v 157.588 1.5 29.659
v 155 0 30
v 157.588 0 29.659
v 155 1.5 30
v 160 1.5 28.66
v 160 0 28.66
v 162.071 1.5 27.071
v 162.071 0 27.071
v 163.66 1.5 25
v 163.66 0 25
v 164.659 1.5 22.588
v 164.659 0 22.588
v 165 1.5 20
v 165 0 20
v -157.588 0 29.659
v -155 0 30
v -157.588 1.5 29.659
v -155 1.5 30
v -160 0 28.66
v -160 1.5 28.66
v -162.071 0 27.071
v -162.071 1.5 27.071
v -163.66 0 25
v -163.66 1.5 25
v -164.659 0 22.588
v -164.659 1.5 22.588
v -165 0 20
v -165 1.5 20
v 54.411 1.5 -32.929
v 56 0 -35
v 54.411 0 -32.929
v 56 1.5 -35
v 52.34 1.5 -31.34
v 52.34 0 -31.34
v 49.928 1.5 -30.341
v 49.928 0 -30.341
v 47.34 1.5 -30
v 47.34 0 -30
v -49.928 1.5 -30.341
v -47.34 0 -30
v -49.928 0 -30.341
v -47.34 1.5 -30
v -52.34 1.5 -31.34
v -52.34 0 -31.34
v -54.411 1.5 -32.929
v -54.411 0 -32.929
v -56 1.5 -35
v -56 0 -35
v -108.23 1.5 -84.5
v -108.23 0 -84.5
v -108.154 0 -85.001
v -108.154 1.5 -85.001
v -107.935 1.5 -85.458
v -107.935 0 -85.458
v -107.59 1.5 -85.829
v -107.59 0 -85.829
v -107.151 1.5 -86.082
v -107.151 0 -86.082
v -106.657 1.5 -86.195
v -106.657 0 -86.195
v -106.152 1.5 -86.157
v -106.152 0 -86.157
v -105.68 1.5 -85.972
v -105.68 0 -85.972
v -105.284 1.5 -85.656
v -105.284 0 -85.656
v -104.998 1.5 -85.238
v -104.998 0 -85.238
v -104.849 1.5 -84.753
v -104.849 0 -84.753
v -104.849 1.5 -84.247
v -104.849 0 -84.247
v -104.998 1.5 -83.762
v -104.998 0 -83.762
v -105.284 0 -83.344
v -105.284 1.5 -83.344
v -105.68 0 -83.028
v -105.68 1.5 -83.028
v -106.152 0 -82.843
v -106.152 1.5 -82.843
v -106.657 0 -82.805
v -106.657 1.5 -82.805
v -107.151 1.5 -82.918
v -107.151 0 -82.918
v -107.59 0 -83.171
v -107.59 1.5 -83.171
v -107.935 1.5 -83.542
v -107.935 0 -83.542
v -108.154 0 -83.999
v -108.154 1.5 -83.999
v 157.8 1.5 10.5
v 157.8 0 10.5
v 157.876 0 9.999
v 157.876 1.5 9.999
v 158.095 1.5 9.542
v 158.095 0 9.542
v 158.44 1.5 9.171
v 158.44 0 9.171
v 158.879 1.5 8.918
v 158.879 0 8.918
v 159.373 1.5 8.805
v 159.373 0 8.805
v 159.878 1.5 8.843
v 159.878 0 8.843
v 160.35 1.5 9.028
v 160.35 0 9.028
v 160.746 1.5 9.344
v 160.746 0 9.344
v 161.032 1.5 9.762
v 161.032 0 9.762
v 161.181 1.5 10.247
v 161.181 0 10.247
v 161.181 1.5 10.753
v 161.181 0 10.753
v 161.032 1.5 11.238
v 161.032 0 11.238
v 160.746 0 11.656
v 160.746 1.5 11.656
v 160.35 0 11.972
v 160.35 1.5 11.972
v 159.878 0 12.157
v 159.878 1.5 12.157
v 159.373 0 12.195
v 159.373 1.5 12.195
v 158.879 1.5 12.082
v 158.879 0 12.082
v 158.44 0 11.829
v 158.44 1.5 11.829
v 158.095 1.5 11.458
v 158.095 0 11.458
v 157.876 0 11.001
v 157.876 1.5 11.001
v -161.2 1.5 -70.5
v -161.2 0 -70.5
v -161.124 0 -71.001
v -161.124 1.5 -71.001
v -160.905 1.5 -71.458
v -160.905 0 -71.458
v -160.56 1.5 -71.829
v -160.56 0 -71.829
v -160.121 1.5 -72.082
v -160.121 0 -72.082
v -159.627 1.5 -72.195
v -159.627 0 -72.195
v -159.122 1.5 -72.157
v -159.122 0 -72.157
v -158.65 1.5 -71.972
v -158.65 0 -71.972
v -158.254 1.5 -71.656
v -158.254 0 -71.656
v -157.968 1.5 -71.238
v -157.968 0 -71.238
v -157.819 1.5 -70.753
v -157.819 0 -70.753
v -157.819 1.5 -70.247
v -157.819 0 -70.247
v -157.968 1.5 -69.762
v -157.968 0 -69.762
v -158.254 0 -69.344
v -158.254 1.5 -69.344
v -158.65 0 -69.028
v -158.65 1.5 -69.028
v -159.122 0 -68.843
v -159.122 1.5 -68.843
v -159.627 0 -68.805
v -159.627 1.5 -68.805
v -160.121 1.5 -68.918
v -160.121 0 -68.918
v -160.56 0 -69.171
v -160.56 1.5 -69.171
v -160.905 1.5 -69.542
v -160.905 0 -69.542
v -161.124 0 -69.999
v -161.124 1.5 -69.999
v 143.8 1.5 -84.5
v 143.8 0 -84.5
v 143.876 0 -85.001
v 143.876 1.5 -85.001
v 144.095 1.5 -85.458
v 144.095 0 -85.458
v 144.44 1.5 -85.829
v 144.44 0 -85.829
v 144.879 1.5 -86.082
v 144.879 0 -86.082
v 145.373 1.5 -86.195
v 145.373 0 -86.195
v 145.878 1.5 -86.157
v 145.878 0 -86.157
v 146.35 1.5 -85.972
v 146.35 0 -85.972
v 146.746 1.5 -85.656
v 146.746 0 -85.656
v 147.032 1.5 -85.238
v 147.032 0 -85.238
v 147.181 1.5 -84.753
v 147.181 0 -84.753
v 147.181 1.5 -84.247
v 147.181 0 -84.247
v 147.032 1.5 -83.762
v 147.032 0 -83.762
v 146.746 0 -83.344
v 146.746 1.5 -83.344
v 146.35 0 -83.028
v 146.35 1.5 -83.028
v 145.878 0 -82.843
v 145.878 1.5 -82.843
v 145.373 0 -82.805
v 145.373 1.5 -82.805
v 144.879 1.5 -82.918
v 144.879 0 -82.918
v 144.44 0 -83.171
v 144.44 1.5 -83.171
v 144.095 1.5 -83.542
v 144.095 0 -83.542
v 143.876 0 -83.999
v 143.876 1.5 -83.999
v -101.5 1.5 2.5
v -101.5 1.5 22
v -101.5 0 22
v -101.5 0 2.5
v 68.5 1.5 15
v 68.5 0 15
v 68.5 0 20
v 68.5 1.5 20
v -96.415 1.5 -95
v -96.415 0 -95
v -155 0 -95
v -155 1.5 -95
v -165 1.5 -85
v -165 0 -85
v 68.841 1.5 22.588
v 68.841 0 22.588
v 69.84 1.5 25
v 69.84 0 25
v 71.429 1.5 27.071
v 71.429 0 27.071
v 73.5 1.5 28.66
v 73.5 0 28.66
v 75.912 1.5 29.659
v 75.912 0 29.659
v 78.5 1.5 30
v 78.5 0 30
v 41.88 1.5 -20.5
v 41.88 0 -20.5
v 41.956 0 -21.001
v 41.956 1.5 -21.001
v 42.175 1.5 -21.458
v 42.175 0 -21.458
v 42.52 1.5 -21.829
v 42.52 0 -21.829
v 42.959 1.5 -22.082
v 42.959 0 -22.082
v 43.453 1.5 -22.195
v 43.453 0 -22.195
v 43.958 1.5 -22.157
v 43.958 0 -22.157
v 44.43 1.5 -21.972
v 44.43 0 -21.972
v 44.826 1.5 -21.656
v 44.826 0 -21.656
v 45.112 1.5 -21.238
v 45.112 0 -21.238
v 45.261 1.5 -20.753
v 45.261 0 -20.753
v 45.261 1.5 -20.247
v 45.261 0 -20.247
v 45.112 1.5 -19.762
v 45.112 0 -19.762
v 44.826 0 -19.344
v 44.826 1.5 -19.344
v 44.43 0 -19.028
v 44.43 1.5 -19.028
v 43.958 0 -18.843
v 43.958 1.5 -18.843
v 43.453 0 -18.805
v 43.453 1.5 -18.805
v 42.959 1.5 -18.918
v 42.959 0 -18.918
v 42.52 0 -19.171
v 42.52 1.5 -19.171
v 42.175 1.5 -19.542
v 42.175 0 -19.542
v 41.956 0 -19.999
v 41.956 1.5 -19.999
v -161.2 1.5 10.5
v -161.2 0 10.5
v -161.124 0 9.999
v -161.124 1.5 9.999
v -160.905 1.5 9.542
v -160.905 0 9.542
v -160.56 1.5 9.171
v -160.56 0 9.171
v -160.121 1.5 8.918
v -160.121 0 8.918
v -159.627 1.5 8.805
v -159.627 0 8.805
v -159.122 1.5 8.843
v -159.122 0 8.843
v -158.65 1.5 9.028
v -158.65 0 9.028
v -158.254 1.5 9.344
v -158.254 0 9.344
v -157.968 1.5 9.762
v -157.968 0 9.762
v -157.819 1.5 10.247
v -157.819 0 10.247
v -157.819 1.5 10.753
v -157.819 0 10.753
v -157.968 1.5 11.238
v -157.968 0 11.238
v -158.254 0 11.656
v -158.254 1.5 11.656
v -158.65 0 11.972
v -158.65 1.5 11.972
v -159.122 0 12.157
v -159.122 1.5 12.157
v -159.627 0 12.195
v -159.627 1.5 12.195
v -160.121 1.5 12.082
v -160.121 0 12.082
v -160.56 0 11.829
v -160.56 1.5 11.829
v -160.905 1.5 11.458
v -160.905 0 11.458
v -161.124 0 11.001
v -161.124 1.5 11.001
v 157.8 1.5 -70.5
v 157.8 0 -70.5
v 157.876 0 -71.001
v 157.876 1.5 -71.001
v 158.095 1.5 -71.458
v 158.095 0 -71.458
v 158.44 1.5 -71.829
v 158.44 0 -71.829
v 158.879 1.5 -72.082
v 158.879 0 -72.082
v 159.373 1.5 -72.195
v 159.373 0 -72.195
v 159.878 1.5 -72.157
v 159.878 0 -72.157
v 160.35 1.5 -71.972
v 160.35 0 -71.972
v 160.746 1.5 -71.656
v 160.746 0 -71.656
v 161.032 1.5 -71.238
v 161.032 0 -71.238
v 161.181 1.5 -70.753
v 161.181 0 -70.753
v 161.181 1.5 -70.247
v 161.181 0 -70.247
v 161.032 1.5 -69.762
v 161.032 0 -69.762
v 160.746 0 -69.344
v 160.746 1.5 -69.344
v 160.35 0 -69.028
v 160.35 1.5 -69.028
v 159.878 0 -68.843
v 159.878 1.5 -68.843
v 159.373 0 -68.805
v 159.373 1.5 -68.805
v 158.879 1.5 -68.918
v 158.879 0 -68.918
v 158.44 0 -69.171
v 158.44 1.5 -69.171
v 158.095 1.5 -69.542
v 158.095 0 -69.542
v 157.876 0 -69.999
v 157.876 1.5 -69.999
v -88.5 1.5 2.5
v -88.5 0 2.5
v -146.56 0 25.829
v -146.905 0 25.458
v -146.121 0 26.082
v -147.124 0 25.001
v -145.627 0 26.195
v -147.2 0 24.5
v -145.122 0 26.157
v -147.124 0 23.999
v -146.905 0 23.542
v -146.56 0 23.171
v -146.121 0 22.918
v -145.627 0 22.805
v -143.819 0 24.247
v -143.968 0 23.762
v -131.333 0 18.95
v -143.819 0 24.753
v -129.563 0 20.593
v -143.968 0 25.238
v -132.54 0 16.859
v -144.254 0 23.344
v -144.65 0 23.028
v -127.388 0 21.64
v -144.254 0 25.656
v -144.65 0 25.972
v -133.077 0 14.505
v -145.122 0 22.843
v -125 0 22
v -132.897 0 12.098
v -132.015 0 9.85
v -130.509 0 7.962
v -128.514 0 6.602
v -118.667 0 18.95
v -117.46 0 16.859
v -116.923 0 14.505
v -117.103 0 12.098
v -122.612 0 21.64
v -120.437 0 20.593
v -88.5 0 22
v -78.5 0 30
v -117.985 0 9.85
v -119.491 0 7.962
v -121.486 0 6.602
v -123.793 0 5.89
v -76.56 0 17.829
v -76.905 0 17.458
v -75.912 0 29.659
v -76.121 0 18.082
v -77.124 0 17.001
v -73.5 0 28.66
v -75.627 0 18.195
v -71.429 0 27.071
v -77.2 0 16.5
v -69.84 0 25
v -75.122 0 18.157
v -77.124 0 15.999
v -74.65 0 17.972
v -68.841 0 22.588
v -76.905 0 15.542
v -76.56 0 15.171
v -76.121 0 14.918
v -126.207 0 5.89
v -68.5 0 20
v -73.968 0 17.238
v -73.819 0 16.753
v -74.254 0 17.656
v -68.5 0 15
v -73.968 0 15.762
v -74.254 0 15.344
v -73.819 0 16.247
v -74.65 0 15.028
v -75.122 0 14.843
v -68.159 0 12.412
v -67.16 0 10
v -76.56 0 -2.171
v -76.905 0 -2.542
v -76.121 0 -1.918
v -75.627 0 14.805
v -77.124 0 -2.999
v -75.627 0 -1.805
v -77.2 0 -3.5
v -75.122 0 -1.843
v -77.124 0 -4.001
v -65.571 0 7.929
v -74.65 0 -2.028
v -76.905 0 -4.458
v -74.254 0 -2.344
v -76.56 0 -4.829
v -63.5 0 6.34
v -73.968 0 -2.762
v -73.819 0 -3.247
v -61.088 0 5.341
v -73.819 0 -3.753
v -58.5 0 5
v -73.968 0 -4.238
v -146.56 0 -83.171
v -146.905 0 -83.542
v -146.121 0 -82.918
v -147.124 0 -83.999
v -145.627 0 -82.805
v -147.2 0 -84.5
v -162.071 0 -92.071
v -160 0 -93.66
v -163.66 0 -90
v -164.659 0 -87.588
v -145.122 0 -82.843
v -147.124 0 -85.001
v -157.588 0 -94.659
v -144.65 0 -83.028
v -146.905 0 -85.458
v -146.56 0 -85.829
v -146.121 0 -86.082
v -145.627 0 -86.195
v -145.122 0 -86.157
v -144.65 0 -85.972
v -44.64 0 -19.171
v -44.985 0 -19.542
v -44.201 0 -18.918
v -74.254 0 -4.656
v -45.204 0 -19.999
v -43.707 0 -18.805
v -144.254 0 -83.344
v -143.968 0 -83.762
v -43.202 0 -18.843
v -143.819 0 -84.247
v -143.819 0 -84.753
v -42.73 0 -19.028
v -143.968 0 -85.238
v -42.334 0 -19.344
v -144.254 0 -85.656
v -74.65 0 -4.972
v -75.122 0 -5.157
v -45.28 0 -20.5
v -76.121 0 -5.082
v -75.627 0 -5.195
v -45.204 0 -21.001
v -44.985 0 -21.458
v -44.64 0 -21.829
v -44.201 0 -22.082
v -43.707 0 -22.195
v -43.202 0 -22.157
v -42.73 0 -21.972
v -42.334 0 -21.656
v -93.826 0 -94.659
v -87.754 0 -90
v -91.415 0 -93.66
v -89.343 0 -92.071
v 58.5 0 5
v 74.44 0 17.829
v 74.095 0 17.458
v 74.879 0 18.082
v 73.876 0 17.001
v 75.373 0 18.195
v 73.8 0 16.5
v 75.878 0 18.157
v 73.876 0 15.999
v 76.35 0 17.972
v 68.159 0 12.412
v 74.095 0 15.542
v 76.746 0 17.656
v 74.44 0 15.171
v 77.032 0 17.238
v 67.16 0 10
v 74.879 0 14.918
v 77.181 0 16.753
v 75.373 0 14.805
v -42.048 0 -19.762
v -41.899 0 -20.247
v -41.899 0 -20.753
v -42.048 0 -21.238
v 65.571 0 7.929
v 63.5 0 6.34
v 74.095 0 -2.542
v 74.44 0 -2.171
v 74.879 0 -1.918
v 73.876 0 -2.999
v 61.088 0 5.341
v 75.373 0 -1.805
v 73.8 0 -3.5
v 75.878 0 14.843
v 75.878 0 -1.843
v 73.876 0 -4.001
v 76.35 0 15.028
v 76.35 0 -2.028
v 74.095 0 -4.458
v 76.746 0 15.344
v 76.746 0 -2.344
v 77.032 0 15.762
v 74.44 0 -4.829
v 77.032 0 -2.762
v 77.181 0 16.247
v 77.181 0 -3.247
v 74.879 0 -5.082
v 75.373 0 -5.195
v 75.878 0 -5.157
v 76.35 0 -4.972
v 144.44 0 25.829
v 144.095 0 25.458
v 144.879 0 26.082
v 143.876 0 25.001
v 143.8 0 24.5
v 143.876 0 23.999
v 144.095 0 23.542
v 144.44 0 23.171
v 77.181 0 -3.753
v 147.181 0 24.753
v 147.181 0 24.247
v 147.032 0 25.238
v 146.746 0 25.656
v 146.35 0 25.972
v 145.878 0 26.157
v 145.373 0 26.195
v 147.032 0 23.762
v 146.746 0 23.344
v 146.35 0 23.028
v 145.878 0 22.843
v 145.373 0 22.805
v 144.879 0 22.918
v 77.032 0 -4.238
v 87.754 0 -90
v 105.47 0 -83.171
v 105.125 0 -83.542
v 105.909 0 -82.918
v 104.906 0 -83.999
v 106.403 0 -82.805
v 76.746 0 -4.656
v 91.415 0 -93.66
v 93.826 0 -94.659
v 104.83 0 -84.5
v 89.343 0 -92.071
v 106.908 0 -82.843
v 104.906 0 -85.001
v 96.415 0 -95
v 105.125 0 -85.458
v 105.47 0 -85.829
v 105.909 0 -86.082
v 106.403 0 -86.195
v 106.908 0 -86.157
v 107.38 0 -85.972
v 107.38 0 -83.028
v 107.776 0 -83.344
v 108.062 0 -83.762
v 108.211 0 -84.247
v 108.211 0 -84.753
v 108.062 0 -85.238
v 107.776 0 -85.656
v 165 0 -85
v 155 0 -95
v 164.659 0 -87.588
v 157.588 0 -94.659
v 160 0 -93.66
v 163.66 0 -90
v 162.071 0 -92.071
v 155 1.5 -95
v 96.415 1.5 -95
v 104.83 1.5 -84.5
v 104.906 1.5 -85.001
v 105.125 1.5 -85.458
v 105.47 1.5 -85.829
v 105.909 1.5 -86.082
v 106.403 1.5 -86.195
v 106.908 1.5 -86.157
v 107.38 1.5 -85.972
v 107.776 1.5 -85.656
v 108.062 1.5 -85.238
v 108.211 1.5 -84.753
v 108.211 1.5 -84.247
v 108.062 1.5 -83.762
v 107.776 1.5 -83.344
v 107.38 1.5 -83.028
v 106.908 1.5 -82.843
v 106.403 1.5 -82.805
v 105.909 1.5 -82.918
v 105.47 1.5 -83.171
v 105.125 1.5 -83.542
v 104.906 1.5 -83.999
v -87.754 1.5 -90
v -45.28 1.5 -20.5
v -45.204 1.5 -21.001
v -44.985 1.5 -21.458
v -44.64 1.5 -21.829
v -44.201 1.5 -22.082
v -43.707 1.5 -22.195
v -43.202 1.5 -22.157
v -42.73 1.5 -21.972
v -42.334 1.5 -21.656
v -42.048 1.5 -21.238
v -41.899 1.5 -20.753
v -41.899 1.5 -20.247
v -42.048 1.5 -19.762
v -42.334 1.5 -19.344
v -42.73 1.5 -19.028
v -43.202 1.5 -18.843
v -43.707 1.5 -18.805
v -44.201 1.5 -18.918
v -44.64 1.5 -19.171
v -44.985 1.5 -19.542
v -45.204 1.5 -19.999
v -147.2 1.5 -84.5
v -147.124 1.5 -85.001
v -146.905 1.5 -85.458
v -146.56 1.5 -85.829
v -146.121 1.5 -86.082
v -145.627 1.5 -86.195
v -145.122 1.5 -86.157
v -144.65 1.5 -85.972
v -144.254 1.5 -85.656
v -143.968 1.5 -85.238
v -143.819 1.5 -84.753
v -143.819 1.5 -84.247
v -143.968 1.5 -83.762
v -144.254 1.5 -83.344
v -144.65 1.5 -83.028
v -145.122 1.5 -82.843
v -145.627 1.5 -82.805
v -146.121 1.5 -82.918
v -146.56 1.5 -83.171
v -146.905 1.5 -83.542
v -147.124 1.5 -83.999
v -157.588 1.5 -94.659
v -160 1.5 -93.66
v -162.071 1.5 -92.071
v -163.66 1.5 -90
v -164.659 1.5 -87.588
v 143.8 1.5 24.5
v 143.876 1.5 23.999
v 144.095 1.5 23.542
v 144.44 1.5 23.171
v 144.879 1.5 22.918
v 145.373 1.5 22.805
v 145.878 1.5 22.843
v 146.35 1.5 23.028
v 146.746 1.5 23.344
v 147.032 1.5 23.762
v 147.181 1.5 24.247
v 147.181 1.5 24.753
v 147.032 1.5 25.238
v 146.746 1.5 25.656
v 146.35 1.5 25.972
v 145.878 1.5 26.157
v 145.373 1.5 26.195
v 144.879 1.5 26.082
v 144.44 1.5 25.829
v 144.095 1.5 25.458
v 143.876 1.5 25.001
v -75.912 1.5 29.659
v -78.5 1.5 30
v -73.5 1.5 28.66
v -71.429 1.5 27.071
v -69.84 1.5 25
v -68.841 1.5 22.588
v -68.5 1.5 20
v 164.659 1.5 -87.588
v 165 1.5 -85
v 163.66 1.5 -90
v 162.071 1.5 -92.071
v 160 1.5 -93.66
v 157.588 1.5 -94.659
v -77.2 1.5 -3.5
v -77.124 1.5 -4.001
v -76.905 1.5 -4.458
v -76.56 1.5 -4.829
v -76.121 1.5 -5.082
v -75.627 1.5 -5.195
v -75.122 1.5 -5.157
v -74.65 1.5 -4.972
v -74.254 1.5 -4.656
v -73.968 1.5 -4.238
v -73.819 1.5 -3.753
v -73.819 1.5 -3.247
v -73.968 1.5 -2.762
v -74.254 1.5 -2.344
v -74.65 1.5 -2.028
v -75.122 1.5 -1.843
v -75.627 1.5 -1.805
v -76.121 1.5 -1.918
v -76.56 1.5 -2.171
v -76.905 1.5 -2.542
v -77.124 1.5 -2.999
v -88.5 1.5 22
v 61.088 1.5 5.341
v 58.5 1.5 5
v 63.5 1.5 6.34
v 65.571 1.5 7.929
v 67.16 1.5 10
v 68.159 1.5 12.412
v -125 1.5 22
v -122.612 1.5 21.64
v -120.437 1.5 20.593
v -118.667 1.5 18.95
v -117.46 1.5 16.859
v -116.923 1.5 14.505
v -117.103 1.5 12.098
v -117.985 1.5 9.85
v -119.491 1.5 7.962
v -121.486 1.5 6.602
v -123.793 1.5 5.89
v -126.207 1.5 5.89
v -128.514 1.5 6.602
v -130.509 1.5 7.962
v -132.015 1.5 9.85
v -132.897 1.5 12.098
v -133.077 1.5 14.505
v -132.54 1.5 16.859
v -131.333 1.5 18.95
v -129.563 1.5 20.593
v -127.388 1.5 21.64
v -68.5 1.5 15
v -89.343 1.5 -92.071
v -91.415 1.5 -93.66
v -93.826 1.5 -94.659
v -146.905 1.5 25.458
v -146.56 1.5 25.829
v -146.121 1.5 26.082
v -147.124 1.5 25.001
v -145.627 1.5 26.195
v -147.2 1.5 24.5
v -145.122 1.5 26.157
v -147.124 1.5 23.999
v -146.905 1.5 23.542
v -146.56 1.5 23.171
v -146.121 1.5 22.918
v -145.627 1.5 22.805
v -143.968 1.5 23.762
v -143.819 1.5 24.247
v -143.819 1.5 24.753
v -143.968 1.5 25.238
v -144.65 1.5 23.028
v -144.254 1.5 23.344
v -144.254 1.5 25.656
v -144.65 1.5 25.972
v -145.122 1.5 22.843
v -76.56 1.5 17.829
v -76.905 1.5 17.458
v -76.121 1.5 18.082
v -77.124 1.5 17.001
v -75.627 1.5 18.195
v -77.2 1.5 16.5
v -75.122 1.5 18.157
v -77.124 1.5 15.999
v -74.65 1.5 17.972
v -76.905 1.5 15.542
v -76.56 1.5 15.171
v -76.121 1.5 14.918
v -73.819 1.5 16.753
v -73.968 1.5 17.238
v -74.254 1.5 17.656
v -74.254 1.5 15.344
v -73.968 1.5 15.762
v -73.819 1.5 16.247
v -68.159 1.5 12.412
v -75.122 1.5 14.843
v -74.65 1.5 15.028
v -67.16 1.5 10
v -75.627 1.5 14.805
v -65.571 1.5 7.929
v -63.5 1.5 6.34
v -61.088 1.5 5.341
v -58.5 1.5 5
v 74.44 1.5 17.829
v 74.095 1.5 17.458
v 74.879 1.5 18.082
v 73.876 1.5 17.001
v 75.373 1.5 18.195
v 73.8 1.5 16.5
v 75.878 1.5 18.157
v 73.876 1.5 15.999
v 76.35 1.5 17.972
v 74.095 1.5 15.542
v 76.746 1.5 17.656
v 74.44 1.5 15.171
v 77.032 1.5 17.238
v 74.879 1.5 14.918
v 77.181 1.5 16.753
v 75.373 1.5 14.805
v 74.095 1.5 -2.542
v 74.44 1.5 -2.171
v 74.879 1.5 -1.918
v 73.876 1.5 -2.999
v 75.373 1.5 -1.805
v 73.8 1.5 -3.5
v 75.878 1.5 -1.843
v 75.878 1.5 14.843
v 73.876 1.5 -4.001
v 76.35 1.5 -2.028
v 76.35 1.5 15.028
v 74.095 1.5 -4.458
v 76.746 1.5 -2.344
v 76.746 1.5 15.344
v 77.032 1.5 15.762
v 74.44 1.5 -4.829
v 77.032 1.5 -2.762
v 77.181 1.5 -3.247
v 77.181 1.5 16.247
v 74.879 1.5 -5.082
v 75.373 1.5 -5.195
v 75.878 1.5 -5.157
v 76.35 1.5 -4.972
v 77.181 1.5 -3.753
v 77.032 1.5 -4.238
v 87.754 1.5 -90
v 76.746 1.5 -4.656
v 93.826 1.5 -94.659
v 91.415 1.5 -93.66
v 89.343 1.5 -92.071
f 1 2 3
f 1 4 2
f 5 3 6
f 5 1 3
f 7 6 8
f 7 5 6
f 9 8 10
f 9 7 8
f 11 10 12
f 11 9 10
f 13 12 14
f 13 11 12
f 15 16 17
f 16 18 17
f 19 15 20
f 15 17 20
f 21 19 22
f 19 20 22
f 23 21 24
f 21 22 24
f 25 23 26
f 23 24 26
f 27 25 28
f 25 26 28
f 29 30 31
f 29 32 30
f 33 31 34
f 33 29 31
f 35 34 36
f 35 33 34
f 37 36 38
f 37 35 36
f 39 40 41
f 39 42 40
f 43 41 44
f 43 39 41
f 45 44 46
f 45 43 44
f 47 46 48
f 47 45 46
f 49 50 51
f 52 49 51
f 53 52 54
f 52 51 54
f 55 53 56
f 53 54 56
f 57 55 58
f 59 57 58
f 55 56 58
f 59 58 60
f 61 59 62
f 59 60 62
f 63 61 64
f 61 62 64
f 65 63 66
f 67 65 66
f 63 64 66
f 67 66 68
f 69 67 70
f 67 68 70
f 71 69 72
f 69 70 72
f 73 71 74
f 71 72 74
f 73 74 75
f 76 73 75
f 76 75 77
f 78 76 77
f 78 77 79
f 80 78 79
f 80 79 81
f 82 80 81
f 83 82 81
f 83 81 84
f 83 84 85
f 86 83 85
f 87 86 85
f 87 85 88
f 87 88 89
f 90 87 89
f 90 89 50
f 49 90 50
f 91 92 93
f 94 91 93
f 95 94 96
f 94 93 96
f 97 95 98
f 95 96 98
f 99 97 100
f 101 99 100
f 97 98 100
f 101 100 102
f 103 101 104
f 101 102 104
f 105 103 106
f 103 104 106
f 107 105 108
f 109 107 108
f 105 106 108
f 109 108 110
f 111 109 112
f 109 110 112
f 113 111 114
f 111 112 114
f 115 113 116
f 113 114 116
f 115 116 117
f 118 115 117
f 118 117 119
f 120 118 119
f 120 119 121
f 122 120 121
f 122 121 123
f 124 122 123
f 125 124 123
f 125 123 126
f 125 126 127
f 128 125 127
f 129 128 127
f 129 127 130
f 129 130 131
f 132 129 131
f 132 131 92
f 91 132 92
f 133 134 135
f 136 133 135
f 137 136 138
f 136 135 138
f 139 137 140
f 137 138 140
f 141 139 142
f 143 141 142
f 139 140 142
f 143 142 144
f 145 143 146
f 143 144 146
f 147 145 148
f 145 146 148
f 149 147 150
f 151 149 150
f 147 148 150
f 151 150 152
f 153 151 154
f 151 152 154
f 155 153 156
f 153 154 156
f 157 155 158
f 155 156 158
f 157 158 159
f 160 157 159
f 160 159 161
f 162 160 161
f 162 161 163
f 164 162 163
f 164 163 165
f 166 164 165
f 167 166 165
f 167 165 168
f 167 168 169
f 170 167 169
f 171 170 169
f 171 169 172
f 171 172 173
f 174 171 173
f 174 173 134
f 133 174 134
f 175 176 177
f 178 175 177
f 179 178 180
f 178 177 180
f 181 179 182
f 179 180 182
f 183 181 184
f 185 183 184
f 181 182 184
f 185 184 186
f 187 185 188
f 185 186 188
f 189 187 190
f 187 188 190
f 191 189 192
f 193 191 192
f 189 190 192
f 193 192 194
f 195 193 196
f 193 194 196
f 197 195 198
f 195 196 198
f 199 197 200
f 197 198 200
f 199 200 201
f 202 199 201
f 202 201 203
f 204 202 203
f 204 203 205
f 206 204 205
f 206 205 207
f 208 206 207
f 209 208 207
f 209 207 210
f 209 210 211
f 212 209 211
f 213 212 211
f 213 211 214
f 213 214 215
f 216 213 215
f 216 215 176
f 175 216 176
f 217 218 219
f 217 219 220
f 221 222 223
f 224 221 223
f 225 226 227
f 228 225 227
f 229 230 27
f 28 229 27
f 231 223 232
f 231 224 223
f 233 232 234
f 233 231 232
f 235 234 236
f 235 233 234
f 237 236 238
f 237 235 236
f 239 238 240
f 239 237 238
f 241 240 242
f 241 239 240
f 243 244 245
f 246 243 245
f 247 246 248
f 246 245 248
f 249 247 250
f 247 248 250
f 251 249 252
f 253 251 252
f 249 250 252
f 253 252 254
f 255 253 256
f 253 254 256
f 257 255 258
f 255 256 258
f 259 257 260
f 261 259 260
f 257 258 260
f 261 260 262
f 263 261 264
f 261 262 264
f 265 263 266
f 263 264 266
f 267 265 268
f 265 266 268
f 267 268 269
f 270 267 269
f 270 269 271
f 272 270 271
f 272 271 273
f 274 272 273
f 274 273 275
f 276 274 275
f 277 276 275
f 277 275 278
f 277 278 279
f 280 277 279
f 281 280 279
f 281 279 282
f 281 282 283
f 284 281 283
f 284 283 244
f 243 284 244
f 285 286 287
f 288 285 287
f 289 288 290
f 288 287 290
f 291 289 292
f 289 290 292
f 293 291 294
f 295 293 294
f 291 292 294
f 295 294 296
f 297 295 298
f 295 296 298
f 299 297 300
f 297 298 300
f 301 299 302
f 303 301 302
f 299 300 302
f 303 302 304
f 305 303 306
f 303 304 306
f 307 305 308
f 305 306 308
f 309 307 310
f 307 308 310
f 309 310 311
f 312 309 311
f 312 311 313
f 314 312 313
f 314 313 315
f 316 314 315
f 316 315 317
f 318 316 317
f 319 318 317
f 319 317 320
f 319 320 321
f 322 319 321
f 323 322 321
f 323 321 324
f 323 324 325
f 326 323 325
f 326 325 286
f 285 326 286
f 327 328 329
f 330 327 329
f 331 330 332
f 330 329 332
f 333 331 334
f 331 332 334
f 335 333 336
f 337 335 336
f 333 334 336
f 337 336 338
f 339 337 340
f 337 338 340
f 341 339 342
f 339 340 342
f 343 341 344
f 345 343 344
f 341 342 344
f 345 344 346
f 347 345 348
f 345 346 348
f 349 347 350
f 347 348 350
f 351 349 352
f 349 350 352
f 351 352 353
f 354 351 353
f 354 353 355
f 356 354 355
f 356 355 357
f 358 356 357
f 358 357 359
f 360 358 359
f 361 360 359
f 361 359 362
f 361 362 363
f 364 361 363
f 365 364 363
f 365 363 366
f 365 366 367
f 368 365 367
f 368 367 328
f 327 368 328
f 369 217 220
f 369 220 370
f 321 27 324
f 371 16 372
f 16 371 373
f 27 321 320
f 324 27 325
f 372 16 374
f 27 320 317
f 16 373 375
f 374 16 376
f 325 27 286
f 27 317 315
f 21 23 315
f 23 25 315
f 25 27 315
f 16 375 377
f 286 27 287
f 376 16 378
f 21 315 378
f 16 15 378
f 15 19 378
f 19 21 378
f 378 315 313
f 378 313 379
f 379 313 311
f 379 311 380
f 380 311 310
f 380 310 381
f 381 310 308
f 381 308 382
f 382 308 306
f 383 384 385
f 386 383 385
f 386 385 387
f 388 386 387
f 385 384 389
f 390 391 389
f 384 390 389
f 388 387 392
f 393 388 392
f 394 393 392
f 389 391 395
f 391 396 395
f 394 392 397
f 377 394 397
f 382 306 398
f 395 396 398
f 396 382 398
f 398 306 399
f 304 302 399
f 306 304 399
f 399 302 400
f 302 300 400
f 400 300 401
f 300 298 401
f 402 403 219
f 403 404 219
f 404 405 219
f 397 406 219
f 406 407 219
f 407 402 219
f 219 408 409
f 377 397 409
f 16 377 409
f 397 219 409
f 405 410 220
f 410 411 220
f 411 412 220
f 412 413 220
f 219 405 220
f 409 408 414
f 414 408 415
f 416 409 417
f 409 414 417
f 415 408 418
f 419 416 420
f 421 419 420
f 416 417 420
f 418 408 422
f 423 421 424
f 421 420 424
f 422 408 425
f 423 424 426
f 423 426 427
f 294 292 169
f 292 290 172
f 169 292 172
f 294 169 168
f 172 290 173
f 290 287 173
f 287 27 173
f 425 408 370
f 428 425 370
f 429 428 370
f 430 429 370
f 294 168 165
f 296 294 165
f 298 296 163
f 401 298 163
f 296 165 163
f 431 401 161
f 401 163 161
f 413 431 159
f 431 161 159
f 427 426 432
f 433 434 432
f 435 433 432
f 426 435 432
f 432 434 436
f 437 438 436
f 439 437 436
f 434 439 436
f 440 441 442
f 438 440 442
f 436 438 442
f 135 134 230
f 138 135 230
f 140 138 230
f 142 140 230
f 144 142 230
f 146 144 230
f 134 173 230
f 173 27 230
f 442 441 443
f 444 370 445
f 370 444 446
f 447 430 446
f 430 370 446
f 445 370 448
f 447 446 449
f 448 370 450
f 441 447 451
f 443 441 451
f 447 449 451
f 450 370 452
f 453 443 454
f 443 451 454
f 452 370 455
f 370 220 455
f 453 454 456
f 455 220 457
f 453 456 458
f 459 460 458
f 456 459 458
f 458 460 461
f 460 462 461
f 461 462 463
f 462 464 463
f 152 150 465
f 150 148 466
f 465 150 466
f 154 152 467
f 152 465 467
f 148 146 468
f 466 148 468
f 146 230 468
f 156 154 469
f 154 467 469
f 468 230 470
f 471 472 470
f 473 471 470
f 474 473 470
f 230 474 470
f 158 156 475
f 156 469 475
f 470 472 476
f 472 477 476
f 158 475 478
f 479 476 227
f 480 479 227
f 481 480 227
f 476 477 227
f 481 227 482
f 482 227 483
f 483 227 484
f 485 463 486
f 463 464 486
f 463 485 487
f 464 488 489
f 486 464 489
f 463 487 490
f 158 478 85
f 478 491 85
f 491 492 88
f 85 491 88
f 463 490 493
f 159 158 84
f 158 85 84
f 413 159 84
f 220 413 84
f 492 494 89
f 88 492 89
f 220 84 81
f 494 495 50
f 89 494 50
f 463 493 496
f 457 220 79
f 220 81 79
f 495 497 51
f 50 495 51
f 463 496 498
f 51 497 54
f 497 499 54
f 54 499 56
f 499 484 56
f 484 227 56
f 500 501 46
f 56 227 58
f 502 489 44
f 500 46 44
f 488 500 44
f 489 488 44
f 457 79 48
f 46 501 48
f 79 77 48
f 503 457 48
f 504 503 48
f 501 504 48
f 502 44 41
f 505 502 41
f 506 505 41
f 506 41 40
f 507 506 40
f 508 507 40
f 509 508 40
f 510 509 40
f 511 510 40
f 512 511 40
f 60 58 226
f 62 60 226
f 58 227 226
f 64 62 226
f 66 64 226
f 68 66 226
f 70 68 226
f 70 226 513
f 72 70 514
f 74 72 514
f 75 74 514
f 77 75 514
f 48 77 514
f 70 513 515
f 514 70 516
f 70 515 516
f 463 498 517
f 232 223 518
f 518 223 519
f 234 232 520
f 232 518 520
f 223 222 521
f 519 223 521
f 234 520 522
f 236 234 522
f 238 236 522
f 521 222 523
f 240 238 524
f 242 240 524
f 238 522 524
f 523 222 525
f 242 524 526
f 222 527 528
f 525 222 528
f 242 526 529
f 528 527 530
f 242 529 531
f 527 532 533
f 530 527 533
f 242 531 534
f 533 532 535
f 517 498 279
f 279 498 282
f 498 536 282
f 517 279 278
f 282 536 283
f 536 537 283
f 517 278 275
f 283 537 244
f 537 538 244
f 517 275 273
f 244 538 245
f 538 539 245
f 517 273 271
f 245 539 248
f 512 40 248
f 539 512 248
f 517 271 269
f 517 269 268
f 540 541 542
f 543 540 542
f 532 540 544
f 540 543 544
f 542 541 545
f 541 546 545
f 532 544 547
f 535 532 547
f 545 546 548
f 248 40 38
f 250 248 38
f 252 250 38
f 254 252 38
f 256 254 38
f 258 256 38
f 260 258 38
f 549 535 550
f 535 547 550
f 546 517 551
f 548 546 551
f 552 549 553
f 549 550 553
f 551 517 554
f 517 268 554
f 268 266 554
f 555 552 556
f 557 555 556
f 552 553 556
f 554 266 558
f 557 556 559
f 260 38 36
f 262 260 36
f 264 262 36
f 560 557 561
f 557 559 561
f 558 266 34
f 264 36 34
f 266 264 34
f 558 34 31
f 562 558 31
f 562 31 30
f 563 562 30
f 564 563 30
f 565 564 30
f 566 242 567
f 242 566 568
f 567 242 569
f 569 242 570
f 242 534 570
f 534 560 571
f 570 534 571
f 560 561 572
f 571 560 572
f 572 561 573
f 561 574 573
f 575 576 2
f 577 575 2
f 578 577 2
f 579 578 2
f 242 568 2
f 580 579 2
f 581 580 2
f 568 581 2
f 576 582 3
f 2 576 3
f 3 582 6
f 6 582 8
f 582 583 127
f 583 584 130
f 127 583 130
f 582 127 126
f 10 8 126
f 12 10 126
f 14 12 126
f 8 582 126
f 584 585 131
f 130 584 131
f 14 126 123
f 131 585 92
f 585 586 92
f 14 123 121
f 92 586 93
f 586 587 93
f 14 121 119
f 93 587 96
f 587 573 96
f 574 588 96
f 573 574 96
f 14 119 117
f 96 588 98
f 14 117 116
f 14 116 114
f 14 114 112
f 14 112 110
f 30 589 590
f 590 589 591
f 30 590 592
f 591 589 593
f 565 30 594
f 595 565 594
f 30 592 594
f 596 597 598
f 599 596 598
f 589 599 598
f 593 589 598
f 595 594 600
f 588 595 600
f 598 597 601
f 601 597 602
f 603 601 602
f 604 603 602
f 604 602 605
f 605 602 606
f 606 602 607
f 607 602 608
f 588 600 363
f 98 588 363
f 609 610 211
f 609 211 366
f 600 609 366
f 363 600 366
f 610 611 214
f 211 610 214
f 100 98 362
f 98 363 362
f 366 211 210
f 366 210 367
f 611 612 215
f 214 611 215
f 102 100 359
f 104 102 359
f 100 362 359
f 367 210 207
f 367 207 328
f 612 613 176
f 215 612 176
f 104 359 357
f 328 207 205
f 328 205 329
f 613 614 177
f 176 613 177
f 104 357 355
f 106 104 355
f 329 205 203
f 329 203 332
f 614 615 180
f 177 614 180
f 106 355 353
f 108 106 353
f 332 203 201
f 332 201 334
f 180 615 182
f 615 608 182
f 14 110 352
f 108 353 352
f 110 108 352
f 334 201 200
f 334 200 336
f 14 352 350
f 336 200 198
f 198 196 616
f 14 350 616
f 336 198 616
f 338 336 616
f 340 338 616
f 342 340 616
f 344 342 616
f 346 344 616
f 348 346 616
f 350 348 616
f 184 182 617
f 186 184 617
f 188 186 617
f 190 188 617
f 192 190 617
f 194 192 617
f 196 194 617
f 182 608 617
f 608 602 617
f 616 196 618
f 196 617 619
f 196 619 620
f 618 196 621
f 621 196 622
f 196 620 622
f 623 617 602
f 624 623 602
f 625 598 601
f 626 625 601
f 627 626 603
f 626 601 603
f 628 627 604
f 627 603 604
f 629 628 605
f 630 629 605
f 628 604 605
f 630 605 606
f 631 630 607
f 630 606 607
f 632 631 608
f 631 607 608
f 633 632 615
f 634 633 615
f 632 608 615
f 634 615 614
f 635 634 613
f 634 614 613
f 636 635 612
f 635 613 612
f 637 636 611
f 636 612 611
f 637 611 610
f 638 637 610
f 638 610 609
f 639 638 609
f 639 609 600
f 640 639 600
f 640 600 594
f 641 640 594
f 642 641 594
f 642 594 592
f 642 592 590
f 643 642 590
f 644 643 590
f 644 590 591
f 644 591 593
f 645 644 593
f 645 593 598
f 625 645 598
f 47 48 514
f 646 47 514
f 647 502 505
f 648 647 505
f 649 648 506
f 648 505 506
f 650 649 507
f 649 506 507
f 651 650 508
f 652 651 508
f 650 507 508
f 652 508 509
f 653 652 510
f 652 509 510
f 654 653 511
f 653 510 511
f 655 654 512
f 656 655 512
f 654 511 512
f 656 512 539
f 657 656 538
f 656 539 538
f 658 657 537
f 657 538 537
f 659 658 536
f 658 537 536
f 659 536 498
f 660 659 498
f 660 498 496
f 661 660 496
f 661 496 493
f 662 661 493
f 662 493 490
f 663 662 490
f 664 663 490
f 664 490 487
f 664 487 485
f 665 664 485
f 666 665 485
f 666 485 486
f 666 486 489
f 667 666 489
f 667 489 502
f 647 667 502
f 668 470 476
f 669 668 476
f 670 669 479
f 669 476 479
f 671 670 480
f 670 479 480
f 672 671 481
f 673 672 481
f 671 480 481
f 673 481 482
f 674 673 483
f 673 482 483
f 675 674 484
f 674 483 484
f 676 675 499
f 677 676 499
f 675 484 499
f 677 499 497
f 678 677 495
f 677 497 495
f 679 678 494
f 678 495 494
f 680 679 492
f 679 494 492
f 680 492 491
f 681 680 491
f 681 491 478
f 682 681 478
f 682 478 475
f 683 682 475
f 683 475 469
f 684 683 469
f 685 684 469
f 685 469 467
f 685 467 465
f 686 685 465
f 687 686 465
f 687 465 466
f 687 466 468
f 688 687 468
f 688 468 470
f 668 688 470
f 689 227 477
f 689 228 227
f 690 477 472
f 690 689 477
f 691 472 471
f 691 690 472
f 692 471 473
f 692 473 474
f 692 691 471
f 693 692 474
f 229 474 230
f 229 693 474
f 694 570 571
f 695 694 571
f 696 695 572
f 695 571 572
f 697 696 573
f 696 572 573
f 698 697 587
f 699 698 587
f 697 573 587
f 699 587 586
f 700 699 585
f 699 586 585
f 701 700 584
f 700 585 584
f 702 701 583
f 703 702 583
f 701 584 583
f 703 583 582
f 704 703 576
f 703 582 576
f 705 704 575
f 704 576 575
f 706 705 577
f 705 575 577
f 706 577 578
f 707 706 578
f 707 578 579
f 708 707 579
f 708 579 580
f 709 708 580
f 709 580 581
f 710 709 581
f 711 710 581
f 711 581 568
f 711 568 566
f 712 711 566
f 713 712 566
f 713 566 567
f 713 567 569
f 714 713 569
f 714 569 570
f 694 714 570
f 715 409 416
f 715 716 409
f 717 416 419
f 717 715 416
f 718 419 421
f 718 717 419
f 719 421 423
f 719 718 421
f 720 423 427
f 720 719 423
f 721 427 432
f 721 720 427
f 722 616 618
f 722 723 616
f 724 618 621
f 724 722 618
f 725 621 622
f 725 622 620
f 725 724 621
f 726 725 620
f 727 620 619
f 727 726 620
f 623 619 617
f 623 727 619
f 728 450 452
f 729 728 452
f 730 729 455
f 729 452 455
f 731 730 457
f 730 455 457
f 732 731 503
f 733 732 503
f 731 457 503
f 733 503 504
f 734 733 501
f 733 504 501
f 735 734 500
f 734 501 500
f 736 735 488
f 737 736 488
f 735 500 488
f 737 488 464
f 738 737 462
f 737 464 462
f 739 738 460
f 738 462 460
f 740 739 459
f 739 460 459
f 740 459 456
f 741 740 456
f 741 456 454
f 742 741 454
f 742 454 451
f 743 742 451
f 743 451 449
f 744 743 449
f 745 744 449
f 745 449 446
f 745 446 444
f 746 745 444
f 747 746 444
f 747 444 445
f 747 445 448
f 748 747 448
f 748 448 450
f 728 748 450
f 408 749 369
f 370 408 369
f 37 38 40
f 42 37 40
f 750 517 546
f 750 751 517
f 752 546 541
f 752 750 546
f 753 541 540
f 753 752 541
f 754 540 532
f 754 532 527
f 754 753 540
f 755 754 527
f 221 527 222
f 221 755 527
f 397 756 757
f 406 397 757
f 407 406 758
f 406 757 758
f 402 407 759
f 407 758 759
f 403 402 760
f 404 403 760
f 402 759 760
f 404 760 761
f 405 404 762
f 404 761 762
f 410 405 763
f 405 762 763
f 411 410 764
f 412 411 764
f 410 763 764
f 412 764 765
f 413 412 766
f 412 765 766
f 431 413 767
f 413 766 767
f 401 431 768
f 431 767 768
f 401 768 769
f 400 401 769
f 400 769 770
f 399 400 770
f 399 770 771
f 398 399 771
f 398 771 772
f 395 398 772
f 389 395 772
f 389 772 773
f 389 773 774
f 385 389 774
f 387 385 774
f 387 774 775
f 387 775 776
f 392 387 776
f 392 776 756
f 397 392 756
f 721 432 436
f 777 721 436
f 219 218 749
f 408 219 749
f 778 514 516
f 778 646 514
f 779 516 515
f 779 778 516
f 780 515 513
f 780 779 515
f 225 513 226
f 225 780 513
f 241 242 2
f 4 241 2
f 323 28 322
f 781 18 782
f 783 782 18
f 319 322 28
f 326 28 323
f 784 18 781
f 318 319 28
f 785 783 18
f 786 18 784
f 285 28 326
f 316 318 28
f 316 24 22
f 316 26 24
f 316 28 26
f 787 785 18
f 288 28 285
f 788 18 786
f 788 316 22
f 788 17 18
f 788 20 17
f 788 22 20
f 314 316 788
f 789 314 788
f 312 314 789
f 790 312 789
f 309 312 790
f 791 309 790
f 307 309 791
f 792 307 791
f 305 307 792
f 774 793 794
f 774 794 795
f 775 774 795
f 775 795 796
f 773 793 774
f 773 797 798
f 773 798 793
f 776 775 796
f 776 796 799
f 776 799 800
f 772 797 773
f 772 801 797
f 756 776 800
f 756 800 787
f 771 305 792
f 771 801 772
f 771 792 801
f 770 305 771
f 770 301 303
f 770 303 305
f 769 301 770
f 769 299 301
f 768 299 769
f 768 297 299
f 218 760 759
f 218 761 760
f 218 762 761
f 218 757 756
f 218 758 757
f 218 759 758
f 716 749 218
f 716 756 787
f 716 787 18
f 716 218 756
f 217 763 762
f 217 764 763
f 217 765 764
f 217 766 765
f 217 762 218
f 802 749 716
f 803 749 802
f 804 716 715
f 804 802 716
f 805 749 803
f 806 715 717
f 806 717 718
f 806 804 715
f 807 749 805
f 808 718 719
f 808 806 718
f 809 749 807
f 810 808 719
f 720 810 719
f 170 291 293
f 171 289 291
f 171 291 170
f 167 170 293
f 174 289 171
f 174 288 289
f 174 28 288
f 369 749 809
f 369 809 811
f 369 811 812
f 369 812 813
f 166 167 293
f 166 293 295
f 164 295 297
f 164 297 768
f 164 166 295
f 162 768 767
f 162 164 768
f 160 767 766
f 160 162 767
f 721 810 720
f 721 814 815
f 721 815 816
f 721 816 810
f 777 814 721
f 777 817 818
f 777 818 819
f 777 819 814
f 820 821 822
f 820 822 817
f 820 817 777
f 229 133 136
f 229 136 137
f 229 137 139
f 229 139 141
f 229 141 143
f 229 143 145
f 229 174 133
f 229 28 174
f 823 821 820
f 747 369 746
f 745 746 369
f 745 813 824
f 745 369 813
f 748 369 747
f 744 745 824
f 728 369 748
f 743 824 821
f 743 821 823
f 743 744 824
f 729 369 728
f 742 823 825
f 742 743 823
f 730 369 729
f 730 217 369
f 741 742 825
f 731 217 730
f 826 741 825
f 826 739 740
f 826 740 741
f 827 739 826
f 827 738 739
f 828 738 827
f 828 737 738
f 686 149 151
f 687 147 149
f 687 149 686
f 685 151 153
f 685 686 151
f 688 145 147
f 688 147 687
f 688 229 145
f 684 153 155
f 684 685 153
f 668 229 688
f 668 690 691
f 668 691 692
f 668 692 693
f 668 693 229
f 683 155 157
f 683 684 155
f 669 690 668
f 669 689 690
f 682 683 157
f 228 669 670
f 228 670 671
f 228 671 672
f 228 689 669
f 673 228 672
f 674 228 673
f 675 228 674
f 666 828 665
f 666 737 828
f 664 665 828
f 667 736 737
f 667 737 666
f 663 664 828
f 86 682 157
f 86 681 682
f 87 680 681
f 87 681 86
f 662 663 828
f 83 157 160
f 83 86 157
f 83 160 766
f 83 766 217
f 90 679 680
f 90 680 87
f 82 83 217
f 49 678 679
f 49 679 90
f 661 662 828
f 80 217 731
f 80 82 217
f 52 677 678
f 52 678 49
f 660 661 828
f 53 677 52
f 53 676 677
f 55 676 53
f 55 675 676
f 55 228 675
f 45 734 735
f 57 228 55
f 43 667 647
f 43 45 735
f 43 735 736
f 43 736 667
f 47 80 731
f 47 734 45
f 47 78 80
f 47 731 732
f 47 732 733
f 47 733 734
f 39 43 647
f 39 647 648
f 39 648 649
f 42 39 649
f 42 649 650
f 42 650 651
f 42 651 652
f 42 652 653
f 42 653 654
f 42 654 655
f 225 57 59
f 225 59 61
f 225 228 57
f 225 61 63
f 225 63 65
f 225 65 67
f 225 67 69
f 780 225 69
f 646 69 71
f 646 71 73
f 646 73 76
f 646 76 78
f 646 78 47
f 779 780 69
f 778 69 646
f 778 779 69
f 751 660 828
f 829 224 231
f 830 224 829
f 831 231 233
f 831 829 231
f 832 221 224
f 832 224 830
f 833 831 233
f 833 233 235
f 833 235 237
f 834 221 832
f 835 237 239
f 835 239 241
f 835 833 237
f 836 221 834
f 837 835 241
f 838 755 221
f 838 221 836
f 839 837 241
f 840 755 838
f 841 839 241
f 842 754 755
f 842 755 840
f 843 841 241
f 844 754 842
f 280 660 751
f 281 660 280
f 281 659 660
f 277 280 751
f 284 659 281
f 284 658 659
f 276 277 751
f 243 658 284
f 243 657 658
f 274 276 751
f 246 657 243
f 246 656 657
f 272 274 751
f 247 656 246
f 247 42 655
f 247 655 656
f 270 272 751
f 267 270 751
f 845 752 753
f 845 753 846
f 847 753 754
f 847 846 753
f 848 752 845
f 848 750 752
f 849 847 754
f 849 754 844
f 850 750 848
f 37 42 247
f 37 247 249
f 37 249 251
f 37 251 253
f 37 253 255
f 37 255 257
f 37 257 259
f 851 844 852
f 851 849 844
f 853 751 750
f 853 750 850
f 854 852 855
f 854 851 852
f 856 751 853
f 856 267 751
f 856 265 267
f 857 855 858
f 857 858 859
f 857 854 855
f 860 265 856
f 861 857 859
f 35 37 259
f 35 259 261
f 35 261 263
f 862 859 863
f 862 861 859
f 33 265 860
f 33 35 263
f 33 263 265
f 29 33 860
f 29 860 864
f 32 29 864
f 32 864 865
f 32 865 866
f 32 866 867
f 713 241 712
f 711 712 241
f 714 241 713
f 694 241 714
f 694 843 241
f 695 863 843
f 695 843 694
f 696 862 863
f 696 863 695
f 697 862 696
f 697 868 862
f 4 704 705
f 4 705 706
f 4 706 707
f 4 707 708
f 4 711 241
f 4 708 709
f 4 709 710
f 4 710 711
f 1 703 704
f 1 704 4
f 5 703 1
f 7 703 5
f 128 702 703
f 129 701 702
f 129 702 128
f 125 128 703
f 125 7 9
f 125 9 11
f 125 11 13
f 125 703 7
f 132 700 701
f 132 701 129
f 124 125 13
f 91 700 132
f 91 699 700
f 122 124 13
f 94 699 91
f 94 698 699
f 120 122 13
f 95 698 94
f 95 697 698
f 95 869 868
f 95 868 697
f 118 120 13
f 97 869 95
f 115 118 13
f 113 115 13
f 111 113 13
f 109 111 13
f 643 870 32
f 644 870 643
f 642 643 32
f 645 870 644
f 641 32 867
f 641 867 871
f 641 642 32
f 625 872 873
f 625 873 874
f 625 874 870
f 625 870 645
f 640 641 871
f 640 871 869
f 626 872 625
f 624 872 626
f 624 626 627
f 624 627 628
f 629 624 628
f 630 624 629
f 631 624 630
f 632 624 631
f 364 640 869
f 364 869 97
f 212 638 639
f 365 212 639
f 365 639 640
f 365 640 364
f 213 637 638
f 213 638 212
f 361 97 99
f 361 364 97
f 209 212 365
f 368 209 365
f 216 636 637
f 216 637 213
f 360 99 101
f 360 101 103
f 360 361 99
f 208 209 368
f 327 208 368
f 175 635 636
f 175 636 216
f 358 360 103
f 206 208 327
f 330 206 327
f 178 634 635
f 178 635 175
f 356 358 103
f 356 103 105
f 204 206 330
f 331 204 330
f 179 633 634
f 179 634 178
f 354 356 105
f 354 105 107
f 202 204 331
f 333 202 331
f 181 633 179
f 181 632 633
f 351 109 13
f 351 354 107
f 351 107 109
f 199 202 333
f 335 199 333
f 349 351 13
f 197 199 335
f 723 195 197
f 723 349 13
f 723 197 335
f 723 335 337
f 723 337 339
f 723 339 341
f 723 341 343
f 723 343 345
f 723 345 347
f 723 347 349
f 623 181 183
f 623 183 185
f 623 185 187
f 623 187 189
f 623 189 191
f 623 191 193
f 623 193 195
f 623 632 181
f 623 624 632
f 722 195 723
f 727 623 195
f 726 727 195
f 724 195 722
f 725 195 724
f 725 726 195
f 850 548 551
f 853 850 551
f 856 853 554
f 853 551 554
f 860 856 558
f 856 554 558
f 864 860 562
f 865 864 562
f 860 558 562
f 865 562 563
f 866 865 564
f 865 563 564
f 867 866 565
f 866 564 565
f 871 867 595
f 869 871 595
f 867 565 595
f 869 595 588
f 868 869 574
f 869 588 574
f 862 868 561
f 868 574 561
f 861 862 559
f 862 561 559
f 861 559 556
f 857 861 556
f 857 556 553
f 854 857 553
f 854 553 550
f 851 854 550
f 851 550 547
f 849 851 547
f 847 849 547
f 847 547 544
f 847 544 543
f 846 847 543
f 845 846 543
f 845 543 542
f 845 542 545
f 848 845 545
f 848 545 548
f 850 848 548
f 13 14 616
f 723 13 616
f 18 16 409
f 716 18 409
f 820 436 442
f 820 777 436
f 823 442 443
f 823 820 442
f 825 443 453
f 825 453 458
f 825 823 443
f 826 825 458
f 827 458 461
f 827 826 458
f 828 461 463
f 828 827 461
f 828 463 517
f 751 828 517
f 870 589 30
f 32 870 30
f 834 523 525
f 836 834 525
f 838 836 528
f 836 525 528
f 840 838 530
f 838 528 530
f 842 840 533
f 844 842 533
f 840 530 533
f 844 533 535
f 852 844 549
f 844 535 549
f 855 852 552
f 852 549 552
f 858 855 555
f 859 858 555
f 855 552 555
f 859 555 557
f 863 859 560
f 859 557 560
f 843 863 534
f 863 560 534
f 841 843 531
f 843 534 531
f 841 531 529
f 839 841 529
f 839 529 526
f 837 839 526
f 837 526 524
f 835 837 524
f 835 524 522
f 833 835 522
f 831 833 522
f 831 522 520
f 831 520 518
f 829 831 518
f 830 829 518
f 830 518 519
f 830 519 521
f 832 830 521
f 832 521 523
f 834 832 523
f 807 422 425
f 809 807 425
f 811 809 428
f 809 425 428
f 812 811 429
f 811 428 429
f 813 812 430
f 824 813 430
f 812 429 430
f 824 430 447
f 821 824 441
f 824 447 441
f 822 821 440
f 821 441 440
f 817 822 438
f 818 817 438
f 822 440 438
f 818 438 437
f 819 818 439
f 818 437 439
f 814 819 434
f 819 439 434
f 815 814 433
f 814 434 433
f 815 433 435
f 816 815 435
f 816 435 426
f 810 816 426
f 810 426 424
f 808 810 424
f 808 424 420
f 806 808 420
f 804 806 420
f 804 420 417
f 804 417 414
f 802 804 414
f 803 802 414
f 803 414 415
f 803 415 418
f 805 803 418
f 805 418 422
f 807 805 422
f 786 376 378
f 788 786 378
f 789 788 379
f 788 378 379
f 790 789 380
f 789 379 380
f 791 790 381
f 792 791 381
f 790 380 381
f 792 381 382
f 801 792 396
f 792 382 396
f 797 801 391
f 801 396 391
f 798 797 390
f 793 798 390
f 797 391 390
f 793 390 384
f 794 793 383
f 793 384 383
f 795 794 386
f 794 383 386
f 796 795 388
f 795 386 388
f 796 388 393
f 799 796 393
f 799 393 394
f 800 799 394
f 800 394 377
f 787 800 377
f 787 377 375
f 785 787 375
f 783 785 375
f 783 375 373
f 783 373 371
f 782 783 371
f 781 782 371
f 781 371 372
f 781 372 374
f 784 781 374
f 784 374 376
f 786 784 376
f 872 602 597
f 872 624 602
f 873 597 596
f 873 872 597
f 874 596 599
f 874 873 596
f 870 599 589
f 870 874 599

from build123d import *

# Parameters (mm, degrees)
BOSS_EXTRU_1_DEPTH      = 1.5
CONG_2_R                = 10
D_GAGEMENT_M31_D        = 3.4
ESQUISSE4_R             = 8.1
ESQUISSE4_W             = 13
ESQUISSE4_H             = 19.5
ENL_V_MAT_EXTRU_1_DEPTH = 191.400236344


with BuildPart() as part:
    # Esquisse1 → Boss.-Extru.1 (new body)
    with BuildSketch(Plane(origin=(0, 0, 0), x_dir=(1, 0, 0), z_dir=(0, 1, 0))):
        Polygon((-165, -30), (-68.5, -30), (-68.5, -5), (68.5, -5), (68.5, -30), (165, -30), (165, 90), (165, 95), (90.641016151, 95), (53.113248654, 30), (-53.113248654, 30), (-90.641016151, 95), (-165, 95), (-165, 90), align=None)
    extrude(amount=BOSS_EXTRU_1_DEPTH)

    # Congé2
    cong_2_edges = [part.edges().sort_by_distance(p)[0] for p in [
        (68.5, 0.75, 30),
        (68.5, 0.75, 5),
        (-68.5, 0.75, 5),
        (-68.5, 0.75, 30),
        (-165, 0.75, 30),
        (-165, 0.75, -95),
        (-90.641016151, 0.75, -95),
        (-53.113248654, 0.75, -30),
        (53.113248654, 0.75, -30),
        (90.641016151, 0.75, -95),
        (165, 0.75, -95),
        (165, 0.75, 30),
    ]]
    fillet(cong_2_edges, radius=CONG_2_R)

    # Dégagement M31 (through all)
    with Locations(Plane(origin=(0, 1.5, 0), x_dir=(1, 0, 0), z_dir=(0, 1, 0))):
        with Locations((-75.5, -16.5), (-75.5, 3.5), (75.5, -16.5), (75.5, 3.5), (-145.5, -24.5), (-159.5, -10.5), (-159.5, 70.5), (-145.5, 84.5), (145.5, -24.5), (159.5, -10.5), (145.5, 84.5), (159.5, 70.5), (-43.58, 20.5), (43.58, 20.5), (-106.53, 84.5), (106.53, 84.5)):
            Hole(D_GAGEMENT_M31_D / 2)

    # Esquisse4 → Enlèv. mat.-Extru.1 (cut, through all)
    with BuildSketch(Plane(origin=(0, 1.5, 0), x_dir=(1, 0, 0), z_dir=(0, 1, 0))):
        with Locations(Location((-125, -13.9, 0), (0, 0, 270))):
            Circle(ESQUISSE4_R)
        with Locations((-95, -12.25)):
            Rectangle(ESQUISSE4_W, ESQUISSE4_H)
    extrude(amount=-ENL_V_MAT_EXTRU_1_DEPTH, mode=Mode.SUBTRACT)


solid = part.part
